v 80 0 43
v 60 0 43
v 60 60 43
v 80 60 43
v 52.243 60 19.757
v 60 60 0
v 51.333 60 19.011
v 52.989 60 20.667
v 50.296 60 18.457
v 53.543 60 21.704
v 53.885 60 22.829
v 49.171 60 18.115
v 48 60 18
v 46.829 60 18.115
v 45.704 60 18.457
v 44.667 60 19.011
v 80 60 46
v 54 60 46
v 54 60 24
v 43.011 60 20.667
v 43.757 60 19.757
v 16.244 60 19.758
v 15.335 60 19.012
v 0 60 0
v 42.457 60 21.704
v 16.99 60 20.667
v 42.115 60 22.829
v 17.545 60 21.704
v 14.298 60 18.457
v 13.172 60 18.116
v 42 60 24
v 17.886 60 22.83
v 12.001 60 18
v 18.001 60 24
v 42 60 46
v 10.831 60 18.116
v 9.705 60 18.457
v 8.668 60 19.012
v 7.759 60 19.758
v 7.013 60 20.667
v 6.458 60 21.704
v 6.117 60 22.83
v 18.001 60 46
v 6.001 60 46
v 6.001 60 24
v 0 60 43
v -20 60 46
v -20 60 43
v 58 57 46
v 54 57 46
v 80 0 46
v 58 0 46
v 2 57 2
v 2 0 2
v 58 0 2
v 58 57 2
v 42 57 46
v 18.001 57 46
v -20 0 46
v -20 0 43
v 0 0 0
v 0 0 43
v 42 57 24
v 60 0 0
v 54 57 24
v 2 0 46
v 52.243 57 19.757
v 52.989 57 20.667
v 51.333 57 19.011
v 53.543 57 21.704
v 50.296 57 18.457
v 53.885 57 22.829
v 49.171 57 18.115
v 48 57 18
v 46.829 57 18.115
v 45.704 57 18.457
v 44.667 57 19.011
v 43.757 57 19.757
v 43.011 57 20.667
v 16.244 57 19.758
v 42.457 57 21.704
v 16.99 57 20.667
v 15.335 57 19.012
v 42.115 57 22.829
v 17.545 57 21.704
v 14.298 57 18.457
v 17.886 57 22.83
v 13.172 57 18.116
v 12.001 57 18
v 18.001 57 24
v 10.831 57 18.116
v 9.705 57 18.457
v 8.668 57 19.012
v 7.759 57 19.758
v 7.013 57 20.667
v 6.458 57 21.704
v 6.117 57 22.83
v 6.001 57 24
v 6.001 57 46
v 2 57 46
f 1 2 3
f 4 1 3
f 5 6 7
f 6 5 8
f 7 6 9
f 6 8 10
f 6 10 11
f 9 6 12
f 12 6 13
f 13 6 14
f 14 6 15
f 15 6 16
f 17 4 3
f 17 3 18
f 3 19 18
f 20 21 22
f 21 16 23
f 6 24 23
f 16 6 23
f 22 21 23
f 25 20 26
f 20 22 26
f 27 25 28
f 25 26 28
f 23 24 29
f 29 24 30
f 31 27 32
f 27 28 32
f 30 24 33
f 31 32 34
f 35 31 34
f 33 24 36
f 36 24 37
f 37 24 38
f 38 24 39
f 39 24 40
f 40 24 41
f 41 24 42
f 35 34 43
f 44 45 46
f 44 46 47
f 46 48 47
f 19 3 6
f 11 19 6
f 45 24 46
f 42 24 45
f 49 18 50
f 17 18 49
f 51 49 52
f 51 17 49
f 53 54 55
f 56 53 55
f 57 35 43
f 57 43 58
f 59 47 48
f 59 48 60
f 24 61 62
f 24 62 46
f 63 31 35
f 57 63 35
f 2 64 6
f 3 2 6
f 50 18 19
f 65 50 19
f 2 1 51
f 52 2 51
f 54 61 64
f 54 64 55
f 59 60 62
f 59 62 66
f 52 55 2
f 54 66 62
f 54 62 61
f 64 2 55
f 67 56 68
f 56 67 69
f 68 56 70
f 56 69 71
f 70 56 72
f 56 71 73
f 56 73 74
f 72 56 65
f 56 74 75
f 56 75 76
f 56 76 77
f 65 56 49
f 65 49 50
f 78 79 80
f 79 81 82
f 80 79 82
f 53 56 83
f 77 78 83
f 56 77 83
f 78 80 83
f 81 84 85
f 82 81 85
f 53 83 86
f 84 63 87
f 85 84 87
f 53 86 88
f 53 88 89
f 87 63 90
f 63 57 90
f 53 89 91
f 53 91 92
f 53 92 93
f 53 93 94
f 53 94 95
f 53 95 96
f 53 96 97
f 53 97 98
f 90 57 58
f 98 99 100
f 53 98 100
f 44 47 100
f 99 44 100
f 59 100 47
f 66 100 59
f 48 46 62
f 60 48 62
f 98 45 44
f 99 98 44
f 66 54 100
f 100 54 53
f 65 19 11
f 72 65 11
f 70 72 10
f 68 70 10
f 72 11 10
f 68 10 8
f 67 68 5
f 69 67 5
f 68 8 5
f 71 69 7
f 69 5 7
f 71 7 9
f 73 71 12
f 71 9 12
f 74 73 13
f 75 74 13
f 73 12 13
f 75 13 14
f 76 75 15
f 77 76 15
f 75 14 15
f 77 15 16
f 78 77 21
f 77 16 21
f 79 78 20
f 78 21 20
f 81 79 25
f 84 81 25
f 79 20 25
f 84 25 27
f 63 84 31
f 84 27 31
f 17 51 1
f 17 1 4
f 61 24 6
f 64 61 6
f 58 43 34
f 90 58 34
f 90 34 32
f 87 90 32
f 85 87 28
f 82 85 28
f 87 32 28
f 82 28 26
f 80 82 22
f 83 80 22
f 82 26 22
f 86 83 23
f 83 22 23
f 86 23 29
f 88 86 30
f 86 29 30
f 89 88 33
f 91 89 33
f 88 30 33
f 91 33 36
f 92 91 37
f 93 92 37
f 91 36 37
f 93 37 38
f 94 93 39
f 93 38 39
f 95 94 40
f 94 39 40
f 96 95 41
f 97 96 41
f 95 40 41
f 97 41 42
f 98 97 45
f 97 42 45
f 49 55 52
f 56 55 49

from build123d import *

# Parameters (mm, degrees)
F0_W      = 2
F0_H      = 60
F1_DEPTH  = 46
F2_DEPTH  = 2
F3_W      = 60
F3_H      = 3
F4_DEPTH  = 20
F5_W      = 60
F5_H      = 3
F6_DEPTH  = 20
F7_W      = 60
F7_H      = 46
F8_DEPTH  = 3
F10_DEPTH = 3


with BuildPart() as f1:
    # F0 (on Top) → F1 (new body)
    with BuildSketch(Plane.XY):
        with Locations((1, 30)):
            Rectangle(F0_W, F0_H)
    extrude(amount=F1_DEPTH)



with BuildPart() as f1b:
    # F0 (on Top) → F1, piece 2 (new body)
    with BuildSketch(Plane.XY):
        with Locations((59, 30)):
            Rectangle(F0_W, F0_H)
    extrude(amount=F1_DEPTH)


with BuildPart() as f1_1:
    add(f1.part)

    add(f1b.part)  # F2 merges F1b
    # F0 (on Top) → F2 (join)
    with BuildSketch(Plane.XY):
        with Locations((1, 30)):
            Rectangle(F0_W, F0_H)
        Polygon((2, 60), (2, 0), (4.7754659317, 0), (58, 0), (58, 60), align=None)
        with Locations((59, 30)):
            Rectangle(F0_W, F0_H)
    extrude(amount=F2_DEPTH)

    # F3 (on face) → F4 (join)
    with BuildSketch(Plane(origin=(0, 0, 0), x_dir=(0, -1, 0), z_dir=(-1, 0, 0))):
        with Locations((-30, 44.5)):
            Rectangle(F3_W, F3_H)
    extrude(amount=F4_DEPTH)

    # F5 (on face) → F6 (join)
    with BuildSketch(Plane.YZ.offset(60)):
        with Locations((30, 44.5)):
            Rectangle(F5_W, F5_H)
    extrude(amount=F6_DEPTH)

    # F7 (on face) → F8 (join)
    with BuildSketch(Plane(origin=(0, 60, 0), x_dir=(-1, 0, 0), z_dir=(0, 1, 0))):
        with Locations((-30, 23)):
            Rectangle(F7_W, F7_H)
    extrude(amount=-F8_DEPTH)

    # F9 (on face) → F10 (cut)
    with BuildSketch(Plane(origin=(0, 60, 0), x_dir=(-1, 0, 0), z_dir=(0, 1, 0))):
        with BuildLine():
            Line((-18.001411375, 46), (-18.001411375, 24.000384872))
            ThreePointArc((-18.001411375, 24.000384872), (-12.001411375, 18.000384872), (-6.001411375, 24.000384872))
            Line((-6.001411375, 24.000384872), (-6.001411375, 46))
            Line((-6.001411375, 46), (-18.001411375, 46))
        make_face()
        with BuildLine():
            Line((-42, 24), (-42, 46))
            Line((-42, 46), (-54, 46))
            Line((-54, 46), (-54, 24))
            ThreePointArc((-54, 24), (-48, 18), (-42, 24))
        make_face()
    extrude(amount=-F10_DEPTH, mode=Mode.SUBTRACT)


solid = f1_1.part
